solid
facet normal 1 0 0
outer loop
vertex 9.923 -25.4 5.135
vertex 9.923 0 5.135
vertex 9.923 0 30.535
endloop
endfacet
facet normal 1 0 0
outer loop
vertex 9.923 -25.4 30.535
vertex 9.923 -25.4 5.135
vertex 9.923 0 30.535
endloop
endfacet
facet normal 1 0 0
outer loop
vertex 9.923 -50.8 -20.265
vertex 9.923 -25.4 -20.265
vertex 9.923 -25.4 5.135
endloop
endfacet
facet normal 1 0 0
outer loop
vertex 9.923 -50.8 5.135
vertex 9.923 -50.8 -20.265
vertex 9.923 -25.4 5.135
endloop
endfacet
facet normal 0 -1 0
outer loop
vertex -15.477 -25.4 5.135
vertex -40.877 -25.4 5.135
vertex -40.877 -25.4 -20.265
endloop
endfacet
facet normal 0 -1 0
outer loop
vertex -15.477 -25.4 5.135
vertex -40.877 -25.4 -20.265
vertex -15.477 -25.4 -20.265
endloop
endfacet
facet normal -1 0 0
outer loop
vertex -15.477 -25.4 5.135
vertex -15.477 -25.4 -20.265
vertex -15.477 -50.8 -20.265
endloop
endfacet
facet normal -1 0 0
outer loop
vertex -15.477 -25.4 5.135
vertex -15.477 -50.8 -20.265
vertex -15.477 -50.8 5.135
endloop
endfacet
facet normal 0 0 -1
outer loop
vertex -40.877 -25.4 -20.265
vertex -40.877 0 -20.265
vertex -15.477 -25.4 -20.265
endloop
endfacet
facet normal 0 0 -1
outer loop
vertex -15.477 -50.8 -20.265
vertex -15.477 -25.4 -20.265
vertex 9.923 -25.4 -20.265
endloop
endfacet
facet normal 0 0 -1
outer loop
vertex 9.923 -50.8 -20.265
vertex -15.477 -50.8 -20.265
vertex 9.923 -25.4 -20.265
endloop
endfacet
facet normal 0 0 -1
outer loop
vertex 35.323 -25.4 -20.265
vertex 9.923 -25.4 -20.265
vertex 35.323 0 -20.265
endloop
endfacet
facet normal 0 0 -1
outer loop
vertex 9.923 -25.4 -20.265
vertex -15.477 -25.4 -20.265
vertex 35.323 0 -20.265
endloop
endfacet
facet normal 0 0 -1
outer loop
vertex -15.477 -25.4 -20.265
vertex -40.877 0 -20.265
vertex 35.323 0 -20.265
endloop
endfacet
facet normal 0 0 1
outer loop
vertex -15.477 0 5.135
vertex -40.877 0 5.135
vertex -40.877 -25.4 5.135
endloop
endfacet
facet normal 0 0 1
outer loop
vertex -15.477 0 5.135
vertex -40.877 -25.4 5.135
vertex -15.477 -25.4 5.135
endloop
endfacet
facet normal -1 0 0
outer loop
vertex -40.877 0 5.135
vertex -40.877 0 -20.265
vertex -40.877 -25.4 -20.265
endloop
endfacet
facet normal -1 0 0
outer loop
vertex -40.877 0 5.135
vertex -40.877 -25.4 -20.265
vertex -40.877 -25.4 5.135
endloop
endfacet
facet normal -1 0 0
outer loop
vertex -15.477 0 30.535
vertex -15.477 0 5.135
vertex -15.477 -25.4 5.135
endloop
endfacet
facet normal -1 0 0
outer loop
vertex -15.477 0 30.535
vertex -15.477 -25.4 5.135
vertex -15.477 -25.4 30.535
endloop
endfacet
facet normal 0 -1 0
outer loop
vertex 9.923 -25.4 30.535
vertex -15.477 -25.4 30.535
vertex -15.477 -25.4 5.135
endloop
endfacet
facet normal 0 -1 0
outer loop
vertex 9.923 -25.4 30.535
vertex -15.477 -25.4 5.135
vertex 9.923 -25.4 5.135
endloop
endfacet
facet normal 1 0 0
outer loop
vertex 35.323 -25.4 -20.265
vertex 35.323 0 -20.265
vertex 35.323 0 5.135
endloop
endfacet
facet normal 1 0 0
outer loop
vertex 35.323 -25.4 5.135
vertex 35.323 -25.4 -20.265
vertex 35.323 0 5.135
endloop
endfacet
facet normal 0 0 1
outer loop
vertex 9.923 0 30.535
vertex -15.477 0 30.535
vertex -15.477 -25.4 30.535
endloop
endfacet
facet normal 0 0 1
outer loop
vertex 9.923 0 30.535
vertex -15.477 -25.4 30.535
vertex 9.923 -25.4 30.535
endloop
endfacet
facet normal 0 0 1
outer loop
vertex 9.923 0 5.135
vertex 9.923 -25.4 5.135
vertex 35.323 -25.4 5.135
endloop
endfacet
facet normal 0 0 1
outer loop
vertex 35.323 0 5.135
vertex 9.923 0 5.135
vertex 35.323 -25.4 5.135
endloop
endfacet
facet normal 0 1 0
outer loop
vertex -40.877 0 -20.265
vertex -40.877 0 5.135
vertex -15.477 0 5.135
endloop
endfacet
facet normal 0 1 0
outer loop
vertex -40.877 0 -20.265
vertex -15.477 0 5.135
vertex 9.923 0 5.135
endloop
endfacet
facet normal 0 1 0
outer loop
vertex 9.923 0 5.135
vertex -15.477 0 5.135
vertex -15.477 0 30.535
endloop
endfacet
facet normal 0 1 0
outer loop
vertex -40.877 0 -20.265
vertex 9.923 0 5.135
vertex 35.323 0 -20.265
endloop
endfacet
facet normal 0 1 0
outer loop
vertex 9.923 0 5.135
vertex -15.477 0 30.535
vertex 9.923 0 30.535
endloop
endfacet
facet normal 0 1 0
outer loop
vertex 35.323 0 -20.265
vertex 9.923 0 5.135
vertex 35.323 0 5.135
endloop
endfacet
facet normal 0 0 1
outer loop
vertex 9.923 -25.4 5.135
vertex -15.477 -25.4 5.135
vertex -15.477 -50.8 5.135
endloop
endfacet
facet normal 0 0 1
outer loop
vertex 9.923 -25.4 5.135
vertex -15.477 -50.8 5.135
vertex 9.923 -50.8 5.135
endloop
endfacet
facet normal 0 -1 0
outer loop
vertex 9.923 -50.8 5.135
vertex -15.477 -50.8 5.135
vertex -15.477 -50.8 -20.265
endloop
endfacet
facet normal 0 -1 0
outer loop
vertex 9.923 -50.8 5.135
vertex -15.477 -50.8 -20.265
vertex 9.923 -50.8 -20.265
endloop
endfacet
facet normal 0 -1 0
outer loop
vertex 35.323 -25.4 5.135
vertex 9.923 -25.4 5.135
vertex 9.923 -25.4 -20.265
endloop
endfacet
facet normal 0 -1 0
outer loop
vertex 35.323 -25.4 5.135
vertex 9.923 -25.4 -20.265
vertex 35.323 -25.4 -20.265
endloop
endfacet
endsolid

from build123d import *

# Parameters (mm, degrees)
F0_W     = 25.4
F0_H     = 25.4
F1_DEPTH = 50.8
F2_DEPTH = 25.4


with BuildPart() as f1:
    # F0 (on Front) → F1 (new body)
    with BuildSketch(Plane.XZ):
        with Locations((-2.776934, -7.56451)):
            Rectangle(F0_W, F0_H)
    extrude(amount=F1_DEPTH)

    # F0 (on Front) → F2 (join)
    with BuildSketch(Plane.XZ):
        with Locations((-28.176934, -7.56451)):
            Rectangle(F0_W, F0_H)
        with Locations((-2.776934, 17.83549)):
            Rectangle(F0_W, F0_H)
        with Locations((22.623066, -7.56451)):
            Rectangle(F0_W, F0_H)
    extrude(amount=F2_DEPTH)


solid = f1.part
